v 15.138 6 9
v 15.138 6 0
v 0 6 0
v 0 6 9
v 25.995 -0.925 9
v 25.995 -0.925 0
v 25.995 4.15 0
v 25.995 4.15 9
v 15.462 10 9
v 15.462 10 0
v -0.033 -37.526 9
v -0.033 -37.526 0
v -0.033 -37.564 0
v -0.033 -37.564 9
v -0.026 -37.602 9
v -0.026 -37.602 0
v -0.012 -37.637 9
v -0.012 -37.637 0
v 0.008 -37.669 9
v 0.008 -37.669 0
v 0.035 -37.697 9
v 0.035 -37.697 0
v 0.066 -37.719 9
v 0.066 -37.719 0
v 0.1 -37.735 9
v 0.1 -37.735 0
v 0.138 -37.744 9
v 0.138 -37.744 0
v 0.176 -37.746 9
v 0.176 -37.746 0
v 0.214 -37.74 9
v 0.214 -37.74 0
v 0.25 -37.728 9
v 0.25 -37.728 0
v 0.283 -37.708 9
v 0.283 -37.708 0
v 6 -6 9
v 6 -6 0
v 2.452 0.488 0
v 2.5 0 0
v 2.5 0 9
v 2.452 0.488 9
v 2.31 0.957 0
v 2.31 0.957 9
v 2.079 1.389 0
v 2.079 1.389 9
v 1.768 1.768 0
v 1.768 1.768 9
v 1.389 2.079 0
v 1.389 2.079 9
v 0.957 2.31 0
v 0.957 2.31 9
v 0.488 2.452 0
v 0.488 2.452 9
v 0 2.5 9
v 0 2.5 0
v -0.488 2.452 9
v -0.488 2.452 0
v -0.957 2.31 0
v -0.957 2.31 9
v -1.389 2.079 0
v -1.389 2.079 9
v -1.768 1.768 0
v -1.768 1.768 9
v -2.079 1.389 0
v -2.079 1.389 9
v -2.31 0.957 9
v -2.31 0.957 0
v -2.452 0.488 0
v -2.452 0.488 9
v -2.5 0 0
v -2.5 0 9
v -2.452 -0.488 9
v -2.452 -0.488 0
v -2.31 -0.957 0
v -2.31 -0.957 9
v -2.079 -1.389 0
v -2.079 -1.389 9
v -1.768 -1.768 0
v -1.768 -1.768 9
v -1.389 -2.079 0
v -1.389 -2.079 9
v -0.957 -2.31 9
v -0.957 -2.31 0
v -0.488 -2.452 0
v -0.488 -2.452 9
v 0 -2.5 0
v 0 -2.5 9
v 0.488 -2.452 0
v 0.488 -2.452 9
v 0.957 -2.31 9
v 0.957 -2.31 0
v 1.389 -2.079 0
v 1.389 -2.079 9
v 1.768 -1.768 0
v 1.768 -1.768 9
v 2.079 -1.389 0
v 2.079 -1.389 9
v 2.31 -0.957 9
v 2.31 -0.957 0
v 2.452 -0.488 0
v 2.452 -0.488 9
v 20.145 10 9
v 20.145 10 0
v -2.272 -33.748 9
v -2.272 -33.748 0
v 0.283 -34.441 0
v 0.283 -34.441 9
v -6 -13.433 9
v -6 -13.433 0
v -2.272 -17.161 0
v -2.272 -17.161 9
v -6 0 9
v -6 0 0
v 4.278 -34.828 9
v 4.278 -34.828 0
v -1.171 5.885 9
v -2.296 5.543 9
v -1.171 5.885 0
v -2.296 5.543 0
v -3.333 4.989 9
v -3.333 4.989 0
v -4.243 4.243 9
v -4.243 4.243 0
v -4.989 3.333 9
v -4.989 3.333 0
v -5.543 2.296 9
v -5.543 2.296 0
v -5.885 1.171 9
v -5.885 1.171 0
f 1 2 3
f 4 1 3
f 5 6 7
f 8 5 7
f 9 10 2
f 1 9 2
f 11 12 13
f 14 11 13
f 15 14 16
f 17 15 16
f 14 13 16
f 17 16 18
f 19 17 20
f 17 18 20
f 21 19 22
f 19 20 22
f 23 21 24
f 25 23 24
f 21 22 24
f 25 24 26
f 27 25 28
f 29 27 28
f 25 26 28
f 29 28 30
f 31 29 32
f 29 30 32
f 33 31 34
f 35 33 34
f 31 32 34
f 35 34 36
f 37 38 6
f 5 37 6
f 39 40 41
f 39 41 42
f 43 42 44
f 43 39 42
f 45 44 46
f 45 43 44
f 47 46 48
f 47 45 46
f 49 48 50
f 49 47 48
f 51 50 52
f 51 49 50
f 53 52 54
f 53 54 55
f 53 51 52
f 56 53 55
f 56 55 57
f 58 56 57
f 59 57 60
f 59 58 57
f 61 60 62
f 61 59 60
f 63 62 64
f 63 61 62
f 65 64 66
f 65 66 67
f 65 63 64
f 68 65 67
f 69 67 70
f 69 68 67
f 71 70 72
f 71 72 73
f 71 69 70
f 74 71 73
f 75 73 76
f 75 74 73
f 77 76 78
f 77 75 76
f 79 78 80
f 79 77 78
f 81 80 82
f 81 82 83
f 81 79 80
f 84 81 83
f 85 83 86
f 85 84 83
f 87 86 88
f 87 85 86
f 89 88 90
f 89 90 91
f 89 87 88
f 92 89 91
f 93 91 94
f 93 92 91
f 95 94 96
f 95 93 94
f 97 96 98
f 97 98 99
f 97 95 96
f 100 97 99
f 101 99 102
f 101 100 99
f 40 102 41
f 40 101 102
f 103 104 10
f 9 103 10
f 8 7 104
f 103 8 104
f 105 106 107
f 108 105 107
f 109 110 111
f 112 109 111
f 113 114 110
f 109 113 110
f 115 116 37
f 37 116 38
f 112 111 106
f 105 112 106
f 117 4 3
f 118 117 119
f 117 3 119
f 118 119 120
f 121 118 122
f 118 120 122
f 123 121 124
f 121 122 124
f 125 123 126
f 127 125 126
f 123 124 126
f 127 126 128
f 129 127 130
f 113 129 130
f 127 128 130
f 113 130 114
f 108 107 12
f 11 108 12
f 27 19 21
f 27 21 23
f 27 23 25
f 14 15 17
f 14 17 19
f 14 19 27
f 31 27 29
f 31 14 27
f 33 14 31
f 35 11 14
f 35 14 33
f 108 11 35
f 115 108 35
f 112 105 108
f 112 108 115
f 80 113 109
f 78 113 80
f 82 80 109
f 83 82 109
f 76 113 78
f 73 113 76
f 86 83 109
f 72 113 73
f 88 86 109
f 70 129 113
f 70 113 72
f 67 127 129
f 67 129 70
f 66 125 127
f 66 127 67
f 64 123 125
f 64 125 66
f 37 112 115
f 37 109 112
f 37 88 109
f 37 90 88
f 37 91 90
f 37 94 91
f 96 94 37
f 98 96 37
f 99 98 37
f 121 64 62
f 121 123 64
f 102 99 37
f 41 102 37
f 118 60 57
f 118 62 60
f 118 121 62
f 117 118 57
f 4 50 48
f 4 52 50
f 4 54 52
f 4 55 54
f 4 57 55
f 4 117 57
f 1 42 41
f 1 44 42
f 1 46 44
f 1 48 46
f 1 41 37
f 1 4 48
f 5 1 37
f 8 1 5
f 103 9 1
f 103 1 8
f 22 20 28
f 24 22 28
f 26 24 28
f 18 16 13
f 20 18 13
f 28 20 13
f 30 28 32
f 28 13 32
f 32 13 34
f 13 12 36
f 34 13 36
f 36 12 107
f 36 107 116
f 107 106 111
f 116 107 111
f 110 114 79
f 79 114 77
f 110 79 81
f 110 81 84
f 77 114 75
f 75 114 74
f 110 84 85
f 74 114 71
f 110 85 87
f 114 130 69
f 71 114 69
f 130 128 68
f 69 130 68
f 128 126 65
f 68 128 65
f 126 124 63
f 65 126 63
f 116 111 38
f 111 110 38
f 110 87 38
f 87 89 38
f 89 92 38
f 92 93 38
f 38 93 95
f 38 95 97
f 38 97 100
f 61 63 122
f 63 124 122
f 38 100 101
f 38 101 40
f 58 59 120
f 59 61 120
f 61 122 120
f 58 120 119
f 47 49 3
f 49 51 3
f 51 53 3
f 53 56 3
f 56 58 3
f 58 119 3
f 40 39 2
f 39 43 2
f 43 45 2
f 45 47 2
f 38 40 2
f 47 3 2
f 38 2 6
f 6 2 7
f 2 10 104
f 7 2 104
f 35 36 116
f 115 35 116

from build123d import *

# Parameters (mm, degrees)
SKETCH_1_R      = 6
SKETCH_1_R_2    = 2.5
EXTRUDE_1_DEPTH = 9


with BuildPart() as part:
    # 스케치1 → 보스-돌출1 (new body)
    # profile 1 of 2: a face of its own
    with BuildSketch(Plane.XY):
        with BuildLine():
            Line((15.138175611, 6), (0, 6))
            ThreePointArc((0, 6), (4.242640687, 4.242640687), (6, 0))
            ThreePointArc((6, 0), (0, -6), (-6, 0))
            Line((-6, 0), (-6, -13.433276283))
            Line((-6, -13.433276283), (-2.272089827, -17.161186456))
            Line((-2.272089827, -17.161186456), (-2.272089827, -33.747703831))
            Line((-2.272089827, -33.747703831), (0.282693742, -34.440633794))
            Line((0.282693742, -34.440633794), (-0.033215199, -37.525789008))
            ThreePointArc((-0.033215199, -37.525789008), (0.065651627, -37.719313216), (0.282693742, -37.70840501))
            Line((0.282693742, -37.70840501), (4.278390118, -34.828200083))
            Line((4.278390118, -34.828200083), (6, -6))
            Line((6, -6), (25.995290484, -0.925171702))
            Line((25.995290484, -0.925171702), (25.995290484, 4.149656597))
            Line((25.995290484, 4.149656597), (20.144947081, 10))
            Line((20.144947081, 10), (15.462448132, 10))
            Line((15.462448132, 10), (15.138175611, 6))
        make_face()
    # profile 2 of 2: a face of its own
    with BuildSketch(Plane.XY):
        Circle(SKETCH_1_R)
        Circle(SKETCH_1_R_2, mode=Mode.SUBTRACT)
    extrude(amount=EXTRUDE_1_DEPTH)


solid = part.part
